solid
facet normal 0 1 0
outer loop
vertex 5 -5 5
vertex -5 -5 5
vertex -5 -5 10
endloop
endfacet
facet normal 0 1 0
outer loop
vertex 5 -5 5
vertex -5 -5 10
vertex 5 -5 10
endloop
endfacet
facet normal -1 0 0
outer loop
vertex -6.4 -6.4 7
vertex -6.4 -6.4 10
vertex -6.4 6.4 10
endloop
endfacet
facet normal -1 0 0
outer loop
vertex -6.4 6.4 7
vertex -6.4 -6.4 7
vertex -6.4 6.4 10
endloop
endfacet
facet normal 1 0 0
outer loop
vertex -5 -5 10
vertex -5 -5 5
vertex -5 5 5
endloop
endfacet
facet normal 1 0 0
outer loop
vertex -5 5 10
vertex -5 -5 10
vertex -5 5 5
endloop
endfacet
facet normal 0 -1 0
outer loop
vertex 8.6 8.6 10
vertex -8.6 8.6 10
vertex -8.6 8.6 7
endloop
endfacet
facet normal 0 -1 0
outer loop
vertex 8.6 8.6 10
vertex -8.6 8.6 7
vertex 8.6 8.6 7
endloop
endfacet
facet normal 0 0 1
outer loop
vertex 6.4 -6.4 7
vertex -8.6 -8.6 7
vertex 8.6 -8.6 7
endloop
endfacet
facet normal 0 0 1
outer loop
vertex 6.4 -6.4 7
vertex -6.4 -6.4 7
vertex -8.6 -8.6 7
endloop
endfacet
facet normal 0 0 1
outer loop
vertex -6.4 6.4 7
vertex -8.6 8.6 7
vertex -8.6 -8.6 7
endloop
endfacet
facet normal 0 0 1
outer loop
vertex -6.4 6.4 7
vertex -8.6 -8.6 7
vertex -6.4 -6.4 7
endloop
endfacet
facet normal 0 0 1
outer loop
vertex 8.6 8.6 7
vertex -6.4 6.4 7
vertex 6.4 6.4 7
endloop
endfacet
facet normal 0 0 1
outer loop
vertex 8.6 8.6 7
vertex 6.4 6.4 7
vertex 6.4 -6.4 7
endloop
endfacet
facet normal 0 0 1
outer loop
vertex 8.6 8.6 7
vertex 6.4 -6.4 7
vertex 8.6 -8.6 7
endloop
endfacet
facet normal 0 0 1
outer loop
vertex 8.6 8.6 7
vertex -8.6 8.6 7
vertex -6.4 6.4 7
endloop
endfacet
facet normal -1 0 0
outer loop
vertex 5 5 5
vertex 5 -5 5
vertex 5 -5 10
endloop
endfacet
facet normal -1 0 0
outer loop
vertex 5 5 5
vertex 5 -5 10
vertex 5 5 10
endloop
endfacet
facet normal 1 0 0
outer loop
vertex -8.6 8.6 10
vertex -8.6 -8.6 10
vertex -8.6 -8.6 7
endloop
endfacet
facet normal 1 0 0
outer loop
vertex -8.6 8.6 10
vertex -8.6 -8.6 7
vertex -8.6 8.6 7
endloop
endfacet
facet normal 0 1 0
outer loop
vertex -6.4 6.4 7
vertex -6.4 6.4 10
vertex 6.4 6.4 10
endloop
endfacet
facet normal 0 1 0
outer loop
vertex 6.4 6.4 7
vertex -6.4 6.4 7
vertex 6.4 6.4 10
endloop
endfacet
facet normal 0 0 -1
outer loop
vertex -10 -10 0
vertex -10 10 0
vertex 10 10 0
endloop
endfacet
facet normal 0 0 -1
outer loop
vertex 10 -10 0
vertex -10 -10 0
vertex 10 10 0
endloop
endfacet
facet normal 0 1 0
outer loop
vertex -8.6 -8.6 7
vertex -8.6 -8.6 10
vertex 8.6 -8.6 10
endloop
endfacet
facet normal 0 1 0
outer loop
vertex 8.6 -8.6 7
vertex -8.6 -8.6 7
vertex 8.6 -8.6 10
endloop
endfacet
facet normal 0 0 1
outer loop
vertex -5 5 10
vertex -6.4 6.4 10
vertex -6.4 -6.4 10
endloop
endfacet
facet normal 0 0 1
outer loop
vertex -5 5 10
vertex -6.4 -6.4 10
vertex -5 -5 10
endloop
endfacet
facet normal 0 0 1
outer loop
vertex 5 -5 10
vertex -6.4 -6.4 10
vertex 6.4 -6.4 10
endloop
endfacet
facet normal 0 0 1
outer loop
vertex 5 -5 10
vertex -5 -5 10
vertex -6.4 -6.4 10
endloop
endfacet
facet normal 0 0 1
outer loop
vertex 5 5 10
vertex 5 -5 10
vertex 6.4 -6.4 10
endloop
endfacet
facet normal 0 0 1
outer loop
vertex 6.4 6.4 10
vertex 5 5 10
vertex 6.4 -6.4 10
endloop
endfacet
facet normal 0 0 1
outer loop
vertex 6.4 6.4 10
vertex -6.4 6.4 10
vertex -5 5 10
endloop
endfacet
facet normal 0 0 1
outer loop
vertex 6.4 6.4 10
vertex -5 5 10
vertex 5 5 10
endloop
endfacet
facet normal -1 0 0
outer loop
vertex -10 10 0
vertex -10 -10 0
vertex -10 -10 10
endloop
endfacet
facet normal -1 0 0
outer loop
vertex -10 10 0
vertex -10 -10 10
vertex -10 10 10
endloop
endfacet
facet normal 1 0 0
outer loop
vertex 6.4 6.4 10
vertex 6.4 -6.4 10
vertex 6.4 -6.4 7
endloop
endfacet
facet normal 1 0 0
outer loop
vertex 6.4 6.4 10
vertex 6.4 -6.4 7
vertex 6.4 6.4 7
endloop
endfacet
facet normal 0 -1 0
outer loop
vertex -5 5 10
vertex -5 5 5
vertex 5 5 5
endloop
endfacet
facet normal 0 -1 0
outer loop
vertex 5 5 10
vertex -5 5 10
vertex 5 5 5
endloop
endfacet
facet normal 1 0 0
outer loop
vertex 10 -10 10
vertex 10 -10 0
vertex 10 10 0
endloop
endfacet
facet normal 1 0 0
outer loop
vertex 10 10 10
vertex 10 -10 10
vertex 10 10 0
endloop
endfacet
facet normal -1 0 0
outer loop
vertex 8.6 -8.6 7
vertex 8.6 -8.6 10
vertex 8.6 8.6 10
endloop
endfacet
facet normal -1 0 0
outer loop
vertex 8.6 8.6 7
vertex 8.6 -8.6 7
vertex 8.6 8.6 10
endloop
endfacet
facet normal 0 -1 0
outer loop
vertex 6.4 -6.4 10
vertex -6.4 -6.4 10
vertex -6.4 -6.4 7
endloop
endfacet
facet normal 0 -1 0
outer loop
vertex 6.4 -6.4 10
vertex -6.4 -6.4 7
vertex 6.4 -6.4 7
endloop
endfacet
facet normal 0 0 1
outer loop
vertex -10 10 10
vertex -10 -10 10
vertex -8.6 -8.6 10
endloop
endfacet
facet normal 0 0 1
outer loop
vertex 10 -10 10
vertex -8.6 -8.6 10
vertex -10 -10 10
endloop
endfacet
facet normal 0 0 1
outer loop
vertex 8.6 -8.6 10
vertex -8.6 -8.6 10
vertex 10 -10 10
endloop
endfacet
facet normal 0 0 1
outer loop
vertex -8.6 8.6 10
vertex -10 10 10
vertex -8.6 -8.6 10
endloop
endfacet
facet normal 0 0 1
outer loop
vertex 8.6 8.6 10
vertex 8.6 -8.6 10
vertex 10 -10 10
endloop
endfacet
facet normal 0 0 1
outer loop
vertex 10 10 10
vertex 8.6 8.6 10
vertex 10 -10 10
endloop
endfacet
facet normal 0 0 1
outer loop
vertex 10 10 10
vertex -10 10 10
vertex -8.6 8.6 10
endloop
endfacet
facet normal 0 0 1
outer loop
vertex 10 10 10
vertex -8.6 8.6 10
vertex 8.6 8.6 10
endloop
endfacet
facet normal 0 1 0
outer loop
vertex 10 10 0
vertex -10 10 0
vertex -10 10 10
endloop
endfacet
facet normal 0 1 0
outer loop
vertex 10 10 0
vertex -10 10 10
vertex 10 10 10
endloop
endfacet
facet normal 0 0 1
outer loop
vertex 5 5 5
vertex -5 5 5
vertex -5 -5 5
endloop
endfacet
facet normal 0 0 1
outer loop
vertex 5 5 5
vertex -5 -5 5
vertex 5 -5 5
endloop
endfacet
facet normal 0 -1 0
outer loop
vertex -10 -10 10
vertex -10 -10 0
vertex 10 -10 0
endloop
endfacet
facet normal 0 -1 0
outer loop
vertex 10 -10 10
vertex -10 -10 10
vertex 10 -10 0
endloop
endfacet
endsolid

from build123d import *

# Parameters (mm, degrees)
SKETCH_1_W          = 20
SKETCH_1_H          = 20
EXTRUDE_1_DEPTH     = 10
SHELL_1_T           = -5
SKETCH_3_W          = 17.2
SKETCH_3_H          = 17.2
SKETCH_3_W_2        = 12.8
SKETCH_3_H_2        = 12.8
CUT_EXTRUDE_1_DEPTH = 3


with BuildPart() as part:
    # ｽｹｯﾁ1 → ﾎﾞｽ - 押し出し1 (new body)
    with BuildSketch(Plane.XY):
        Rectangle(SKETCH_1_W, SKETCH_1_H)
    extrude(amount=EXTRUDE_1_DEPTH)

    # ｼｪﾙ1
    shell_1_openings = [part.faces().sort_by_distance(p)[0] for p in [
        (0, 0, 10),
    ]]
    offset(amount=SHELL_1_T, openings=shell_1_openings, kind=Kind.INTERSECTION)

    # ｽｹｯﾁ3 → ｶｯﾄ - 押し出し1 (cut)
    with BuildSketch(Plane.XY.offset(10)):
        Rectangle(SKETCH_3_W, SKETCH_3_H)
        Rectangle(SKETCH_3_W_2, SKETCH_3_H_2, mode=Mode.SUBTRACT)
    extrude(amount=-CUT_EXTRUDE_1_DEPTH, mode=Mode.SUBTRACT)


solid = part.part
